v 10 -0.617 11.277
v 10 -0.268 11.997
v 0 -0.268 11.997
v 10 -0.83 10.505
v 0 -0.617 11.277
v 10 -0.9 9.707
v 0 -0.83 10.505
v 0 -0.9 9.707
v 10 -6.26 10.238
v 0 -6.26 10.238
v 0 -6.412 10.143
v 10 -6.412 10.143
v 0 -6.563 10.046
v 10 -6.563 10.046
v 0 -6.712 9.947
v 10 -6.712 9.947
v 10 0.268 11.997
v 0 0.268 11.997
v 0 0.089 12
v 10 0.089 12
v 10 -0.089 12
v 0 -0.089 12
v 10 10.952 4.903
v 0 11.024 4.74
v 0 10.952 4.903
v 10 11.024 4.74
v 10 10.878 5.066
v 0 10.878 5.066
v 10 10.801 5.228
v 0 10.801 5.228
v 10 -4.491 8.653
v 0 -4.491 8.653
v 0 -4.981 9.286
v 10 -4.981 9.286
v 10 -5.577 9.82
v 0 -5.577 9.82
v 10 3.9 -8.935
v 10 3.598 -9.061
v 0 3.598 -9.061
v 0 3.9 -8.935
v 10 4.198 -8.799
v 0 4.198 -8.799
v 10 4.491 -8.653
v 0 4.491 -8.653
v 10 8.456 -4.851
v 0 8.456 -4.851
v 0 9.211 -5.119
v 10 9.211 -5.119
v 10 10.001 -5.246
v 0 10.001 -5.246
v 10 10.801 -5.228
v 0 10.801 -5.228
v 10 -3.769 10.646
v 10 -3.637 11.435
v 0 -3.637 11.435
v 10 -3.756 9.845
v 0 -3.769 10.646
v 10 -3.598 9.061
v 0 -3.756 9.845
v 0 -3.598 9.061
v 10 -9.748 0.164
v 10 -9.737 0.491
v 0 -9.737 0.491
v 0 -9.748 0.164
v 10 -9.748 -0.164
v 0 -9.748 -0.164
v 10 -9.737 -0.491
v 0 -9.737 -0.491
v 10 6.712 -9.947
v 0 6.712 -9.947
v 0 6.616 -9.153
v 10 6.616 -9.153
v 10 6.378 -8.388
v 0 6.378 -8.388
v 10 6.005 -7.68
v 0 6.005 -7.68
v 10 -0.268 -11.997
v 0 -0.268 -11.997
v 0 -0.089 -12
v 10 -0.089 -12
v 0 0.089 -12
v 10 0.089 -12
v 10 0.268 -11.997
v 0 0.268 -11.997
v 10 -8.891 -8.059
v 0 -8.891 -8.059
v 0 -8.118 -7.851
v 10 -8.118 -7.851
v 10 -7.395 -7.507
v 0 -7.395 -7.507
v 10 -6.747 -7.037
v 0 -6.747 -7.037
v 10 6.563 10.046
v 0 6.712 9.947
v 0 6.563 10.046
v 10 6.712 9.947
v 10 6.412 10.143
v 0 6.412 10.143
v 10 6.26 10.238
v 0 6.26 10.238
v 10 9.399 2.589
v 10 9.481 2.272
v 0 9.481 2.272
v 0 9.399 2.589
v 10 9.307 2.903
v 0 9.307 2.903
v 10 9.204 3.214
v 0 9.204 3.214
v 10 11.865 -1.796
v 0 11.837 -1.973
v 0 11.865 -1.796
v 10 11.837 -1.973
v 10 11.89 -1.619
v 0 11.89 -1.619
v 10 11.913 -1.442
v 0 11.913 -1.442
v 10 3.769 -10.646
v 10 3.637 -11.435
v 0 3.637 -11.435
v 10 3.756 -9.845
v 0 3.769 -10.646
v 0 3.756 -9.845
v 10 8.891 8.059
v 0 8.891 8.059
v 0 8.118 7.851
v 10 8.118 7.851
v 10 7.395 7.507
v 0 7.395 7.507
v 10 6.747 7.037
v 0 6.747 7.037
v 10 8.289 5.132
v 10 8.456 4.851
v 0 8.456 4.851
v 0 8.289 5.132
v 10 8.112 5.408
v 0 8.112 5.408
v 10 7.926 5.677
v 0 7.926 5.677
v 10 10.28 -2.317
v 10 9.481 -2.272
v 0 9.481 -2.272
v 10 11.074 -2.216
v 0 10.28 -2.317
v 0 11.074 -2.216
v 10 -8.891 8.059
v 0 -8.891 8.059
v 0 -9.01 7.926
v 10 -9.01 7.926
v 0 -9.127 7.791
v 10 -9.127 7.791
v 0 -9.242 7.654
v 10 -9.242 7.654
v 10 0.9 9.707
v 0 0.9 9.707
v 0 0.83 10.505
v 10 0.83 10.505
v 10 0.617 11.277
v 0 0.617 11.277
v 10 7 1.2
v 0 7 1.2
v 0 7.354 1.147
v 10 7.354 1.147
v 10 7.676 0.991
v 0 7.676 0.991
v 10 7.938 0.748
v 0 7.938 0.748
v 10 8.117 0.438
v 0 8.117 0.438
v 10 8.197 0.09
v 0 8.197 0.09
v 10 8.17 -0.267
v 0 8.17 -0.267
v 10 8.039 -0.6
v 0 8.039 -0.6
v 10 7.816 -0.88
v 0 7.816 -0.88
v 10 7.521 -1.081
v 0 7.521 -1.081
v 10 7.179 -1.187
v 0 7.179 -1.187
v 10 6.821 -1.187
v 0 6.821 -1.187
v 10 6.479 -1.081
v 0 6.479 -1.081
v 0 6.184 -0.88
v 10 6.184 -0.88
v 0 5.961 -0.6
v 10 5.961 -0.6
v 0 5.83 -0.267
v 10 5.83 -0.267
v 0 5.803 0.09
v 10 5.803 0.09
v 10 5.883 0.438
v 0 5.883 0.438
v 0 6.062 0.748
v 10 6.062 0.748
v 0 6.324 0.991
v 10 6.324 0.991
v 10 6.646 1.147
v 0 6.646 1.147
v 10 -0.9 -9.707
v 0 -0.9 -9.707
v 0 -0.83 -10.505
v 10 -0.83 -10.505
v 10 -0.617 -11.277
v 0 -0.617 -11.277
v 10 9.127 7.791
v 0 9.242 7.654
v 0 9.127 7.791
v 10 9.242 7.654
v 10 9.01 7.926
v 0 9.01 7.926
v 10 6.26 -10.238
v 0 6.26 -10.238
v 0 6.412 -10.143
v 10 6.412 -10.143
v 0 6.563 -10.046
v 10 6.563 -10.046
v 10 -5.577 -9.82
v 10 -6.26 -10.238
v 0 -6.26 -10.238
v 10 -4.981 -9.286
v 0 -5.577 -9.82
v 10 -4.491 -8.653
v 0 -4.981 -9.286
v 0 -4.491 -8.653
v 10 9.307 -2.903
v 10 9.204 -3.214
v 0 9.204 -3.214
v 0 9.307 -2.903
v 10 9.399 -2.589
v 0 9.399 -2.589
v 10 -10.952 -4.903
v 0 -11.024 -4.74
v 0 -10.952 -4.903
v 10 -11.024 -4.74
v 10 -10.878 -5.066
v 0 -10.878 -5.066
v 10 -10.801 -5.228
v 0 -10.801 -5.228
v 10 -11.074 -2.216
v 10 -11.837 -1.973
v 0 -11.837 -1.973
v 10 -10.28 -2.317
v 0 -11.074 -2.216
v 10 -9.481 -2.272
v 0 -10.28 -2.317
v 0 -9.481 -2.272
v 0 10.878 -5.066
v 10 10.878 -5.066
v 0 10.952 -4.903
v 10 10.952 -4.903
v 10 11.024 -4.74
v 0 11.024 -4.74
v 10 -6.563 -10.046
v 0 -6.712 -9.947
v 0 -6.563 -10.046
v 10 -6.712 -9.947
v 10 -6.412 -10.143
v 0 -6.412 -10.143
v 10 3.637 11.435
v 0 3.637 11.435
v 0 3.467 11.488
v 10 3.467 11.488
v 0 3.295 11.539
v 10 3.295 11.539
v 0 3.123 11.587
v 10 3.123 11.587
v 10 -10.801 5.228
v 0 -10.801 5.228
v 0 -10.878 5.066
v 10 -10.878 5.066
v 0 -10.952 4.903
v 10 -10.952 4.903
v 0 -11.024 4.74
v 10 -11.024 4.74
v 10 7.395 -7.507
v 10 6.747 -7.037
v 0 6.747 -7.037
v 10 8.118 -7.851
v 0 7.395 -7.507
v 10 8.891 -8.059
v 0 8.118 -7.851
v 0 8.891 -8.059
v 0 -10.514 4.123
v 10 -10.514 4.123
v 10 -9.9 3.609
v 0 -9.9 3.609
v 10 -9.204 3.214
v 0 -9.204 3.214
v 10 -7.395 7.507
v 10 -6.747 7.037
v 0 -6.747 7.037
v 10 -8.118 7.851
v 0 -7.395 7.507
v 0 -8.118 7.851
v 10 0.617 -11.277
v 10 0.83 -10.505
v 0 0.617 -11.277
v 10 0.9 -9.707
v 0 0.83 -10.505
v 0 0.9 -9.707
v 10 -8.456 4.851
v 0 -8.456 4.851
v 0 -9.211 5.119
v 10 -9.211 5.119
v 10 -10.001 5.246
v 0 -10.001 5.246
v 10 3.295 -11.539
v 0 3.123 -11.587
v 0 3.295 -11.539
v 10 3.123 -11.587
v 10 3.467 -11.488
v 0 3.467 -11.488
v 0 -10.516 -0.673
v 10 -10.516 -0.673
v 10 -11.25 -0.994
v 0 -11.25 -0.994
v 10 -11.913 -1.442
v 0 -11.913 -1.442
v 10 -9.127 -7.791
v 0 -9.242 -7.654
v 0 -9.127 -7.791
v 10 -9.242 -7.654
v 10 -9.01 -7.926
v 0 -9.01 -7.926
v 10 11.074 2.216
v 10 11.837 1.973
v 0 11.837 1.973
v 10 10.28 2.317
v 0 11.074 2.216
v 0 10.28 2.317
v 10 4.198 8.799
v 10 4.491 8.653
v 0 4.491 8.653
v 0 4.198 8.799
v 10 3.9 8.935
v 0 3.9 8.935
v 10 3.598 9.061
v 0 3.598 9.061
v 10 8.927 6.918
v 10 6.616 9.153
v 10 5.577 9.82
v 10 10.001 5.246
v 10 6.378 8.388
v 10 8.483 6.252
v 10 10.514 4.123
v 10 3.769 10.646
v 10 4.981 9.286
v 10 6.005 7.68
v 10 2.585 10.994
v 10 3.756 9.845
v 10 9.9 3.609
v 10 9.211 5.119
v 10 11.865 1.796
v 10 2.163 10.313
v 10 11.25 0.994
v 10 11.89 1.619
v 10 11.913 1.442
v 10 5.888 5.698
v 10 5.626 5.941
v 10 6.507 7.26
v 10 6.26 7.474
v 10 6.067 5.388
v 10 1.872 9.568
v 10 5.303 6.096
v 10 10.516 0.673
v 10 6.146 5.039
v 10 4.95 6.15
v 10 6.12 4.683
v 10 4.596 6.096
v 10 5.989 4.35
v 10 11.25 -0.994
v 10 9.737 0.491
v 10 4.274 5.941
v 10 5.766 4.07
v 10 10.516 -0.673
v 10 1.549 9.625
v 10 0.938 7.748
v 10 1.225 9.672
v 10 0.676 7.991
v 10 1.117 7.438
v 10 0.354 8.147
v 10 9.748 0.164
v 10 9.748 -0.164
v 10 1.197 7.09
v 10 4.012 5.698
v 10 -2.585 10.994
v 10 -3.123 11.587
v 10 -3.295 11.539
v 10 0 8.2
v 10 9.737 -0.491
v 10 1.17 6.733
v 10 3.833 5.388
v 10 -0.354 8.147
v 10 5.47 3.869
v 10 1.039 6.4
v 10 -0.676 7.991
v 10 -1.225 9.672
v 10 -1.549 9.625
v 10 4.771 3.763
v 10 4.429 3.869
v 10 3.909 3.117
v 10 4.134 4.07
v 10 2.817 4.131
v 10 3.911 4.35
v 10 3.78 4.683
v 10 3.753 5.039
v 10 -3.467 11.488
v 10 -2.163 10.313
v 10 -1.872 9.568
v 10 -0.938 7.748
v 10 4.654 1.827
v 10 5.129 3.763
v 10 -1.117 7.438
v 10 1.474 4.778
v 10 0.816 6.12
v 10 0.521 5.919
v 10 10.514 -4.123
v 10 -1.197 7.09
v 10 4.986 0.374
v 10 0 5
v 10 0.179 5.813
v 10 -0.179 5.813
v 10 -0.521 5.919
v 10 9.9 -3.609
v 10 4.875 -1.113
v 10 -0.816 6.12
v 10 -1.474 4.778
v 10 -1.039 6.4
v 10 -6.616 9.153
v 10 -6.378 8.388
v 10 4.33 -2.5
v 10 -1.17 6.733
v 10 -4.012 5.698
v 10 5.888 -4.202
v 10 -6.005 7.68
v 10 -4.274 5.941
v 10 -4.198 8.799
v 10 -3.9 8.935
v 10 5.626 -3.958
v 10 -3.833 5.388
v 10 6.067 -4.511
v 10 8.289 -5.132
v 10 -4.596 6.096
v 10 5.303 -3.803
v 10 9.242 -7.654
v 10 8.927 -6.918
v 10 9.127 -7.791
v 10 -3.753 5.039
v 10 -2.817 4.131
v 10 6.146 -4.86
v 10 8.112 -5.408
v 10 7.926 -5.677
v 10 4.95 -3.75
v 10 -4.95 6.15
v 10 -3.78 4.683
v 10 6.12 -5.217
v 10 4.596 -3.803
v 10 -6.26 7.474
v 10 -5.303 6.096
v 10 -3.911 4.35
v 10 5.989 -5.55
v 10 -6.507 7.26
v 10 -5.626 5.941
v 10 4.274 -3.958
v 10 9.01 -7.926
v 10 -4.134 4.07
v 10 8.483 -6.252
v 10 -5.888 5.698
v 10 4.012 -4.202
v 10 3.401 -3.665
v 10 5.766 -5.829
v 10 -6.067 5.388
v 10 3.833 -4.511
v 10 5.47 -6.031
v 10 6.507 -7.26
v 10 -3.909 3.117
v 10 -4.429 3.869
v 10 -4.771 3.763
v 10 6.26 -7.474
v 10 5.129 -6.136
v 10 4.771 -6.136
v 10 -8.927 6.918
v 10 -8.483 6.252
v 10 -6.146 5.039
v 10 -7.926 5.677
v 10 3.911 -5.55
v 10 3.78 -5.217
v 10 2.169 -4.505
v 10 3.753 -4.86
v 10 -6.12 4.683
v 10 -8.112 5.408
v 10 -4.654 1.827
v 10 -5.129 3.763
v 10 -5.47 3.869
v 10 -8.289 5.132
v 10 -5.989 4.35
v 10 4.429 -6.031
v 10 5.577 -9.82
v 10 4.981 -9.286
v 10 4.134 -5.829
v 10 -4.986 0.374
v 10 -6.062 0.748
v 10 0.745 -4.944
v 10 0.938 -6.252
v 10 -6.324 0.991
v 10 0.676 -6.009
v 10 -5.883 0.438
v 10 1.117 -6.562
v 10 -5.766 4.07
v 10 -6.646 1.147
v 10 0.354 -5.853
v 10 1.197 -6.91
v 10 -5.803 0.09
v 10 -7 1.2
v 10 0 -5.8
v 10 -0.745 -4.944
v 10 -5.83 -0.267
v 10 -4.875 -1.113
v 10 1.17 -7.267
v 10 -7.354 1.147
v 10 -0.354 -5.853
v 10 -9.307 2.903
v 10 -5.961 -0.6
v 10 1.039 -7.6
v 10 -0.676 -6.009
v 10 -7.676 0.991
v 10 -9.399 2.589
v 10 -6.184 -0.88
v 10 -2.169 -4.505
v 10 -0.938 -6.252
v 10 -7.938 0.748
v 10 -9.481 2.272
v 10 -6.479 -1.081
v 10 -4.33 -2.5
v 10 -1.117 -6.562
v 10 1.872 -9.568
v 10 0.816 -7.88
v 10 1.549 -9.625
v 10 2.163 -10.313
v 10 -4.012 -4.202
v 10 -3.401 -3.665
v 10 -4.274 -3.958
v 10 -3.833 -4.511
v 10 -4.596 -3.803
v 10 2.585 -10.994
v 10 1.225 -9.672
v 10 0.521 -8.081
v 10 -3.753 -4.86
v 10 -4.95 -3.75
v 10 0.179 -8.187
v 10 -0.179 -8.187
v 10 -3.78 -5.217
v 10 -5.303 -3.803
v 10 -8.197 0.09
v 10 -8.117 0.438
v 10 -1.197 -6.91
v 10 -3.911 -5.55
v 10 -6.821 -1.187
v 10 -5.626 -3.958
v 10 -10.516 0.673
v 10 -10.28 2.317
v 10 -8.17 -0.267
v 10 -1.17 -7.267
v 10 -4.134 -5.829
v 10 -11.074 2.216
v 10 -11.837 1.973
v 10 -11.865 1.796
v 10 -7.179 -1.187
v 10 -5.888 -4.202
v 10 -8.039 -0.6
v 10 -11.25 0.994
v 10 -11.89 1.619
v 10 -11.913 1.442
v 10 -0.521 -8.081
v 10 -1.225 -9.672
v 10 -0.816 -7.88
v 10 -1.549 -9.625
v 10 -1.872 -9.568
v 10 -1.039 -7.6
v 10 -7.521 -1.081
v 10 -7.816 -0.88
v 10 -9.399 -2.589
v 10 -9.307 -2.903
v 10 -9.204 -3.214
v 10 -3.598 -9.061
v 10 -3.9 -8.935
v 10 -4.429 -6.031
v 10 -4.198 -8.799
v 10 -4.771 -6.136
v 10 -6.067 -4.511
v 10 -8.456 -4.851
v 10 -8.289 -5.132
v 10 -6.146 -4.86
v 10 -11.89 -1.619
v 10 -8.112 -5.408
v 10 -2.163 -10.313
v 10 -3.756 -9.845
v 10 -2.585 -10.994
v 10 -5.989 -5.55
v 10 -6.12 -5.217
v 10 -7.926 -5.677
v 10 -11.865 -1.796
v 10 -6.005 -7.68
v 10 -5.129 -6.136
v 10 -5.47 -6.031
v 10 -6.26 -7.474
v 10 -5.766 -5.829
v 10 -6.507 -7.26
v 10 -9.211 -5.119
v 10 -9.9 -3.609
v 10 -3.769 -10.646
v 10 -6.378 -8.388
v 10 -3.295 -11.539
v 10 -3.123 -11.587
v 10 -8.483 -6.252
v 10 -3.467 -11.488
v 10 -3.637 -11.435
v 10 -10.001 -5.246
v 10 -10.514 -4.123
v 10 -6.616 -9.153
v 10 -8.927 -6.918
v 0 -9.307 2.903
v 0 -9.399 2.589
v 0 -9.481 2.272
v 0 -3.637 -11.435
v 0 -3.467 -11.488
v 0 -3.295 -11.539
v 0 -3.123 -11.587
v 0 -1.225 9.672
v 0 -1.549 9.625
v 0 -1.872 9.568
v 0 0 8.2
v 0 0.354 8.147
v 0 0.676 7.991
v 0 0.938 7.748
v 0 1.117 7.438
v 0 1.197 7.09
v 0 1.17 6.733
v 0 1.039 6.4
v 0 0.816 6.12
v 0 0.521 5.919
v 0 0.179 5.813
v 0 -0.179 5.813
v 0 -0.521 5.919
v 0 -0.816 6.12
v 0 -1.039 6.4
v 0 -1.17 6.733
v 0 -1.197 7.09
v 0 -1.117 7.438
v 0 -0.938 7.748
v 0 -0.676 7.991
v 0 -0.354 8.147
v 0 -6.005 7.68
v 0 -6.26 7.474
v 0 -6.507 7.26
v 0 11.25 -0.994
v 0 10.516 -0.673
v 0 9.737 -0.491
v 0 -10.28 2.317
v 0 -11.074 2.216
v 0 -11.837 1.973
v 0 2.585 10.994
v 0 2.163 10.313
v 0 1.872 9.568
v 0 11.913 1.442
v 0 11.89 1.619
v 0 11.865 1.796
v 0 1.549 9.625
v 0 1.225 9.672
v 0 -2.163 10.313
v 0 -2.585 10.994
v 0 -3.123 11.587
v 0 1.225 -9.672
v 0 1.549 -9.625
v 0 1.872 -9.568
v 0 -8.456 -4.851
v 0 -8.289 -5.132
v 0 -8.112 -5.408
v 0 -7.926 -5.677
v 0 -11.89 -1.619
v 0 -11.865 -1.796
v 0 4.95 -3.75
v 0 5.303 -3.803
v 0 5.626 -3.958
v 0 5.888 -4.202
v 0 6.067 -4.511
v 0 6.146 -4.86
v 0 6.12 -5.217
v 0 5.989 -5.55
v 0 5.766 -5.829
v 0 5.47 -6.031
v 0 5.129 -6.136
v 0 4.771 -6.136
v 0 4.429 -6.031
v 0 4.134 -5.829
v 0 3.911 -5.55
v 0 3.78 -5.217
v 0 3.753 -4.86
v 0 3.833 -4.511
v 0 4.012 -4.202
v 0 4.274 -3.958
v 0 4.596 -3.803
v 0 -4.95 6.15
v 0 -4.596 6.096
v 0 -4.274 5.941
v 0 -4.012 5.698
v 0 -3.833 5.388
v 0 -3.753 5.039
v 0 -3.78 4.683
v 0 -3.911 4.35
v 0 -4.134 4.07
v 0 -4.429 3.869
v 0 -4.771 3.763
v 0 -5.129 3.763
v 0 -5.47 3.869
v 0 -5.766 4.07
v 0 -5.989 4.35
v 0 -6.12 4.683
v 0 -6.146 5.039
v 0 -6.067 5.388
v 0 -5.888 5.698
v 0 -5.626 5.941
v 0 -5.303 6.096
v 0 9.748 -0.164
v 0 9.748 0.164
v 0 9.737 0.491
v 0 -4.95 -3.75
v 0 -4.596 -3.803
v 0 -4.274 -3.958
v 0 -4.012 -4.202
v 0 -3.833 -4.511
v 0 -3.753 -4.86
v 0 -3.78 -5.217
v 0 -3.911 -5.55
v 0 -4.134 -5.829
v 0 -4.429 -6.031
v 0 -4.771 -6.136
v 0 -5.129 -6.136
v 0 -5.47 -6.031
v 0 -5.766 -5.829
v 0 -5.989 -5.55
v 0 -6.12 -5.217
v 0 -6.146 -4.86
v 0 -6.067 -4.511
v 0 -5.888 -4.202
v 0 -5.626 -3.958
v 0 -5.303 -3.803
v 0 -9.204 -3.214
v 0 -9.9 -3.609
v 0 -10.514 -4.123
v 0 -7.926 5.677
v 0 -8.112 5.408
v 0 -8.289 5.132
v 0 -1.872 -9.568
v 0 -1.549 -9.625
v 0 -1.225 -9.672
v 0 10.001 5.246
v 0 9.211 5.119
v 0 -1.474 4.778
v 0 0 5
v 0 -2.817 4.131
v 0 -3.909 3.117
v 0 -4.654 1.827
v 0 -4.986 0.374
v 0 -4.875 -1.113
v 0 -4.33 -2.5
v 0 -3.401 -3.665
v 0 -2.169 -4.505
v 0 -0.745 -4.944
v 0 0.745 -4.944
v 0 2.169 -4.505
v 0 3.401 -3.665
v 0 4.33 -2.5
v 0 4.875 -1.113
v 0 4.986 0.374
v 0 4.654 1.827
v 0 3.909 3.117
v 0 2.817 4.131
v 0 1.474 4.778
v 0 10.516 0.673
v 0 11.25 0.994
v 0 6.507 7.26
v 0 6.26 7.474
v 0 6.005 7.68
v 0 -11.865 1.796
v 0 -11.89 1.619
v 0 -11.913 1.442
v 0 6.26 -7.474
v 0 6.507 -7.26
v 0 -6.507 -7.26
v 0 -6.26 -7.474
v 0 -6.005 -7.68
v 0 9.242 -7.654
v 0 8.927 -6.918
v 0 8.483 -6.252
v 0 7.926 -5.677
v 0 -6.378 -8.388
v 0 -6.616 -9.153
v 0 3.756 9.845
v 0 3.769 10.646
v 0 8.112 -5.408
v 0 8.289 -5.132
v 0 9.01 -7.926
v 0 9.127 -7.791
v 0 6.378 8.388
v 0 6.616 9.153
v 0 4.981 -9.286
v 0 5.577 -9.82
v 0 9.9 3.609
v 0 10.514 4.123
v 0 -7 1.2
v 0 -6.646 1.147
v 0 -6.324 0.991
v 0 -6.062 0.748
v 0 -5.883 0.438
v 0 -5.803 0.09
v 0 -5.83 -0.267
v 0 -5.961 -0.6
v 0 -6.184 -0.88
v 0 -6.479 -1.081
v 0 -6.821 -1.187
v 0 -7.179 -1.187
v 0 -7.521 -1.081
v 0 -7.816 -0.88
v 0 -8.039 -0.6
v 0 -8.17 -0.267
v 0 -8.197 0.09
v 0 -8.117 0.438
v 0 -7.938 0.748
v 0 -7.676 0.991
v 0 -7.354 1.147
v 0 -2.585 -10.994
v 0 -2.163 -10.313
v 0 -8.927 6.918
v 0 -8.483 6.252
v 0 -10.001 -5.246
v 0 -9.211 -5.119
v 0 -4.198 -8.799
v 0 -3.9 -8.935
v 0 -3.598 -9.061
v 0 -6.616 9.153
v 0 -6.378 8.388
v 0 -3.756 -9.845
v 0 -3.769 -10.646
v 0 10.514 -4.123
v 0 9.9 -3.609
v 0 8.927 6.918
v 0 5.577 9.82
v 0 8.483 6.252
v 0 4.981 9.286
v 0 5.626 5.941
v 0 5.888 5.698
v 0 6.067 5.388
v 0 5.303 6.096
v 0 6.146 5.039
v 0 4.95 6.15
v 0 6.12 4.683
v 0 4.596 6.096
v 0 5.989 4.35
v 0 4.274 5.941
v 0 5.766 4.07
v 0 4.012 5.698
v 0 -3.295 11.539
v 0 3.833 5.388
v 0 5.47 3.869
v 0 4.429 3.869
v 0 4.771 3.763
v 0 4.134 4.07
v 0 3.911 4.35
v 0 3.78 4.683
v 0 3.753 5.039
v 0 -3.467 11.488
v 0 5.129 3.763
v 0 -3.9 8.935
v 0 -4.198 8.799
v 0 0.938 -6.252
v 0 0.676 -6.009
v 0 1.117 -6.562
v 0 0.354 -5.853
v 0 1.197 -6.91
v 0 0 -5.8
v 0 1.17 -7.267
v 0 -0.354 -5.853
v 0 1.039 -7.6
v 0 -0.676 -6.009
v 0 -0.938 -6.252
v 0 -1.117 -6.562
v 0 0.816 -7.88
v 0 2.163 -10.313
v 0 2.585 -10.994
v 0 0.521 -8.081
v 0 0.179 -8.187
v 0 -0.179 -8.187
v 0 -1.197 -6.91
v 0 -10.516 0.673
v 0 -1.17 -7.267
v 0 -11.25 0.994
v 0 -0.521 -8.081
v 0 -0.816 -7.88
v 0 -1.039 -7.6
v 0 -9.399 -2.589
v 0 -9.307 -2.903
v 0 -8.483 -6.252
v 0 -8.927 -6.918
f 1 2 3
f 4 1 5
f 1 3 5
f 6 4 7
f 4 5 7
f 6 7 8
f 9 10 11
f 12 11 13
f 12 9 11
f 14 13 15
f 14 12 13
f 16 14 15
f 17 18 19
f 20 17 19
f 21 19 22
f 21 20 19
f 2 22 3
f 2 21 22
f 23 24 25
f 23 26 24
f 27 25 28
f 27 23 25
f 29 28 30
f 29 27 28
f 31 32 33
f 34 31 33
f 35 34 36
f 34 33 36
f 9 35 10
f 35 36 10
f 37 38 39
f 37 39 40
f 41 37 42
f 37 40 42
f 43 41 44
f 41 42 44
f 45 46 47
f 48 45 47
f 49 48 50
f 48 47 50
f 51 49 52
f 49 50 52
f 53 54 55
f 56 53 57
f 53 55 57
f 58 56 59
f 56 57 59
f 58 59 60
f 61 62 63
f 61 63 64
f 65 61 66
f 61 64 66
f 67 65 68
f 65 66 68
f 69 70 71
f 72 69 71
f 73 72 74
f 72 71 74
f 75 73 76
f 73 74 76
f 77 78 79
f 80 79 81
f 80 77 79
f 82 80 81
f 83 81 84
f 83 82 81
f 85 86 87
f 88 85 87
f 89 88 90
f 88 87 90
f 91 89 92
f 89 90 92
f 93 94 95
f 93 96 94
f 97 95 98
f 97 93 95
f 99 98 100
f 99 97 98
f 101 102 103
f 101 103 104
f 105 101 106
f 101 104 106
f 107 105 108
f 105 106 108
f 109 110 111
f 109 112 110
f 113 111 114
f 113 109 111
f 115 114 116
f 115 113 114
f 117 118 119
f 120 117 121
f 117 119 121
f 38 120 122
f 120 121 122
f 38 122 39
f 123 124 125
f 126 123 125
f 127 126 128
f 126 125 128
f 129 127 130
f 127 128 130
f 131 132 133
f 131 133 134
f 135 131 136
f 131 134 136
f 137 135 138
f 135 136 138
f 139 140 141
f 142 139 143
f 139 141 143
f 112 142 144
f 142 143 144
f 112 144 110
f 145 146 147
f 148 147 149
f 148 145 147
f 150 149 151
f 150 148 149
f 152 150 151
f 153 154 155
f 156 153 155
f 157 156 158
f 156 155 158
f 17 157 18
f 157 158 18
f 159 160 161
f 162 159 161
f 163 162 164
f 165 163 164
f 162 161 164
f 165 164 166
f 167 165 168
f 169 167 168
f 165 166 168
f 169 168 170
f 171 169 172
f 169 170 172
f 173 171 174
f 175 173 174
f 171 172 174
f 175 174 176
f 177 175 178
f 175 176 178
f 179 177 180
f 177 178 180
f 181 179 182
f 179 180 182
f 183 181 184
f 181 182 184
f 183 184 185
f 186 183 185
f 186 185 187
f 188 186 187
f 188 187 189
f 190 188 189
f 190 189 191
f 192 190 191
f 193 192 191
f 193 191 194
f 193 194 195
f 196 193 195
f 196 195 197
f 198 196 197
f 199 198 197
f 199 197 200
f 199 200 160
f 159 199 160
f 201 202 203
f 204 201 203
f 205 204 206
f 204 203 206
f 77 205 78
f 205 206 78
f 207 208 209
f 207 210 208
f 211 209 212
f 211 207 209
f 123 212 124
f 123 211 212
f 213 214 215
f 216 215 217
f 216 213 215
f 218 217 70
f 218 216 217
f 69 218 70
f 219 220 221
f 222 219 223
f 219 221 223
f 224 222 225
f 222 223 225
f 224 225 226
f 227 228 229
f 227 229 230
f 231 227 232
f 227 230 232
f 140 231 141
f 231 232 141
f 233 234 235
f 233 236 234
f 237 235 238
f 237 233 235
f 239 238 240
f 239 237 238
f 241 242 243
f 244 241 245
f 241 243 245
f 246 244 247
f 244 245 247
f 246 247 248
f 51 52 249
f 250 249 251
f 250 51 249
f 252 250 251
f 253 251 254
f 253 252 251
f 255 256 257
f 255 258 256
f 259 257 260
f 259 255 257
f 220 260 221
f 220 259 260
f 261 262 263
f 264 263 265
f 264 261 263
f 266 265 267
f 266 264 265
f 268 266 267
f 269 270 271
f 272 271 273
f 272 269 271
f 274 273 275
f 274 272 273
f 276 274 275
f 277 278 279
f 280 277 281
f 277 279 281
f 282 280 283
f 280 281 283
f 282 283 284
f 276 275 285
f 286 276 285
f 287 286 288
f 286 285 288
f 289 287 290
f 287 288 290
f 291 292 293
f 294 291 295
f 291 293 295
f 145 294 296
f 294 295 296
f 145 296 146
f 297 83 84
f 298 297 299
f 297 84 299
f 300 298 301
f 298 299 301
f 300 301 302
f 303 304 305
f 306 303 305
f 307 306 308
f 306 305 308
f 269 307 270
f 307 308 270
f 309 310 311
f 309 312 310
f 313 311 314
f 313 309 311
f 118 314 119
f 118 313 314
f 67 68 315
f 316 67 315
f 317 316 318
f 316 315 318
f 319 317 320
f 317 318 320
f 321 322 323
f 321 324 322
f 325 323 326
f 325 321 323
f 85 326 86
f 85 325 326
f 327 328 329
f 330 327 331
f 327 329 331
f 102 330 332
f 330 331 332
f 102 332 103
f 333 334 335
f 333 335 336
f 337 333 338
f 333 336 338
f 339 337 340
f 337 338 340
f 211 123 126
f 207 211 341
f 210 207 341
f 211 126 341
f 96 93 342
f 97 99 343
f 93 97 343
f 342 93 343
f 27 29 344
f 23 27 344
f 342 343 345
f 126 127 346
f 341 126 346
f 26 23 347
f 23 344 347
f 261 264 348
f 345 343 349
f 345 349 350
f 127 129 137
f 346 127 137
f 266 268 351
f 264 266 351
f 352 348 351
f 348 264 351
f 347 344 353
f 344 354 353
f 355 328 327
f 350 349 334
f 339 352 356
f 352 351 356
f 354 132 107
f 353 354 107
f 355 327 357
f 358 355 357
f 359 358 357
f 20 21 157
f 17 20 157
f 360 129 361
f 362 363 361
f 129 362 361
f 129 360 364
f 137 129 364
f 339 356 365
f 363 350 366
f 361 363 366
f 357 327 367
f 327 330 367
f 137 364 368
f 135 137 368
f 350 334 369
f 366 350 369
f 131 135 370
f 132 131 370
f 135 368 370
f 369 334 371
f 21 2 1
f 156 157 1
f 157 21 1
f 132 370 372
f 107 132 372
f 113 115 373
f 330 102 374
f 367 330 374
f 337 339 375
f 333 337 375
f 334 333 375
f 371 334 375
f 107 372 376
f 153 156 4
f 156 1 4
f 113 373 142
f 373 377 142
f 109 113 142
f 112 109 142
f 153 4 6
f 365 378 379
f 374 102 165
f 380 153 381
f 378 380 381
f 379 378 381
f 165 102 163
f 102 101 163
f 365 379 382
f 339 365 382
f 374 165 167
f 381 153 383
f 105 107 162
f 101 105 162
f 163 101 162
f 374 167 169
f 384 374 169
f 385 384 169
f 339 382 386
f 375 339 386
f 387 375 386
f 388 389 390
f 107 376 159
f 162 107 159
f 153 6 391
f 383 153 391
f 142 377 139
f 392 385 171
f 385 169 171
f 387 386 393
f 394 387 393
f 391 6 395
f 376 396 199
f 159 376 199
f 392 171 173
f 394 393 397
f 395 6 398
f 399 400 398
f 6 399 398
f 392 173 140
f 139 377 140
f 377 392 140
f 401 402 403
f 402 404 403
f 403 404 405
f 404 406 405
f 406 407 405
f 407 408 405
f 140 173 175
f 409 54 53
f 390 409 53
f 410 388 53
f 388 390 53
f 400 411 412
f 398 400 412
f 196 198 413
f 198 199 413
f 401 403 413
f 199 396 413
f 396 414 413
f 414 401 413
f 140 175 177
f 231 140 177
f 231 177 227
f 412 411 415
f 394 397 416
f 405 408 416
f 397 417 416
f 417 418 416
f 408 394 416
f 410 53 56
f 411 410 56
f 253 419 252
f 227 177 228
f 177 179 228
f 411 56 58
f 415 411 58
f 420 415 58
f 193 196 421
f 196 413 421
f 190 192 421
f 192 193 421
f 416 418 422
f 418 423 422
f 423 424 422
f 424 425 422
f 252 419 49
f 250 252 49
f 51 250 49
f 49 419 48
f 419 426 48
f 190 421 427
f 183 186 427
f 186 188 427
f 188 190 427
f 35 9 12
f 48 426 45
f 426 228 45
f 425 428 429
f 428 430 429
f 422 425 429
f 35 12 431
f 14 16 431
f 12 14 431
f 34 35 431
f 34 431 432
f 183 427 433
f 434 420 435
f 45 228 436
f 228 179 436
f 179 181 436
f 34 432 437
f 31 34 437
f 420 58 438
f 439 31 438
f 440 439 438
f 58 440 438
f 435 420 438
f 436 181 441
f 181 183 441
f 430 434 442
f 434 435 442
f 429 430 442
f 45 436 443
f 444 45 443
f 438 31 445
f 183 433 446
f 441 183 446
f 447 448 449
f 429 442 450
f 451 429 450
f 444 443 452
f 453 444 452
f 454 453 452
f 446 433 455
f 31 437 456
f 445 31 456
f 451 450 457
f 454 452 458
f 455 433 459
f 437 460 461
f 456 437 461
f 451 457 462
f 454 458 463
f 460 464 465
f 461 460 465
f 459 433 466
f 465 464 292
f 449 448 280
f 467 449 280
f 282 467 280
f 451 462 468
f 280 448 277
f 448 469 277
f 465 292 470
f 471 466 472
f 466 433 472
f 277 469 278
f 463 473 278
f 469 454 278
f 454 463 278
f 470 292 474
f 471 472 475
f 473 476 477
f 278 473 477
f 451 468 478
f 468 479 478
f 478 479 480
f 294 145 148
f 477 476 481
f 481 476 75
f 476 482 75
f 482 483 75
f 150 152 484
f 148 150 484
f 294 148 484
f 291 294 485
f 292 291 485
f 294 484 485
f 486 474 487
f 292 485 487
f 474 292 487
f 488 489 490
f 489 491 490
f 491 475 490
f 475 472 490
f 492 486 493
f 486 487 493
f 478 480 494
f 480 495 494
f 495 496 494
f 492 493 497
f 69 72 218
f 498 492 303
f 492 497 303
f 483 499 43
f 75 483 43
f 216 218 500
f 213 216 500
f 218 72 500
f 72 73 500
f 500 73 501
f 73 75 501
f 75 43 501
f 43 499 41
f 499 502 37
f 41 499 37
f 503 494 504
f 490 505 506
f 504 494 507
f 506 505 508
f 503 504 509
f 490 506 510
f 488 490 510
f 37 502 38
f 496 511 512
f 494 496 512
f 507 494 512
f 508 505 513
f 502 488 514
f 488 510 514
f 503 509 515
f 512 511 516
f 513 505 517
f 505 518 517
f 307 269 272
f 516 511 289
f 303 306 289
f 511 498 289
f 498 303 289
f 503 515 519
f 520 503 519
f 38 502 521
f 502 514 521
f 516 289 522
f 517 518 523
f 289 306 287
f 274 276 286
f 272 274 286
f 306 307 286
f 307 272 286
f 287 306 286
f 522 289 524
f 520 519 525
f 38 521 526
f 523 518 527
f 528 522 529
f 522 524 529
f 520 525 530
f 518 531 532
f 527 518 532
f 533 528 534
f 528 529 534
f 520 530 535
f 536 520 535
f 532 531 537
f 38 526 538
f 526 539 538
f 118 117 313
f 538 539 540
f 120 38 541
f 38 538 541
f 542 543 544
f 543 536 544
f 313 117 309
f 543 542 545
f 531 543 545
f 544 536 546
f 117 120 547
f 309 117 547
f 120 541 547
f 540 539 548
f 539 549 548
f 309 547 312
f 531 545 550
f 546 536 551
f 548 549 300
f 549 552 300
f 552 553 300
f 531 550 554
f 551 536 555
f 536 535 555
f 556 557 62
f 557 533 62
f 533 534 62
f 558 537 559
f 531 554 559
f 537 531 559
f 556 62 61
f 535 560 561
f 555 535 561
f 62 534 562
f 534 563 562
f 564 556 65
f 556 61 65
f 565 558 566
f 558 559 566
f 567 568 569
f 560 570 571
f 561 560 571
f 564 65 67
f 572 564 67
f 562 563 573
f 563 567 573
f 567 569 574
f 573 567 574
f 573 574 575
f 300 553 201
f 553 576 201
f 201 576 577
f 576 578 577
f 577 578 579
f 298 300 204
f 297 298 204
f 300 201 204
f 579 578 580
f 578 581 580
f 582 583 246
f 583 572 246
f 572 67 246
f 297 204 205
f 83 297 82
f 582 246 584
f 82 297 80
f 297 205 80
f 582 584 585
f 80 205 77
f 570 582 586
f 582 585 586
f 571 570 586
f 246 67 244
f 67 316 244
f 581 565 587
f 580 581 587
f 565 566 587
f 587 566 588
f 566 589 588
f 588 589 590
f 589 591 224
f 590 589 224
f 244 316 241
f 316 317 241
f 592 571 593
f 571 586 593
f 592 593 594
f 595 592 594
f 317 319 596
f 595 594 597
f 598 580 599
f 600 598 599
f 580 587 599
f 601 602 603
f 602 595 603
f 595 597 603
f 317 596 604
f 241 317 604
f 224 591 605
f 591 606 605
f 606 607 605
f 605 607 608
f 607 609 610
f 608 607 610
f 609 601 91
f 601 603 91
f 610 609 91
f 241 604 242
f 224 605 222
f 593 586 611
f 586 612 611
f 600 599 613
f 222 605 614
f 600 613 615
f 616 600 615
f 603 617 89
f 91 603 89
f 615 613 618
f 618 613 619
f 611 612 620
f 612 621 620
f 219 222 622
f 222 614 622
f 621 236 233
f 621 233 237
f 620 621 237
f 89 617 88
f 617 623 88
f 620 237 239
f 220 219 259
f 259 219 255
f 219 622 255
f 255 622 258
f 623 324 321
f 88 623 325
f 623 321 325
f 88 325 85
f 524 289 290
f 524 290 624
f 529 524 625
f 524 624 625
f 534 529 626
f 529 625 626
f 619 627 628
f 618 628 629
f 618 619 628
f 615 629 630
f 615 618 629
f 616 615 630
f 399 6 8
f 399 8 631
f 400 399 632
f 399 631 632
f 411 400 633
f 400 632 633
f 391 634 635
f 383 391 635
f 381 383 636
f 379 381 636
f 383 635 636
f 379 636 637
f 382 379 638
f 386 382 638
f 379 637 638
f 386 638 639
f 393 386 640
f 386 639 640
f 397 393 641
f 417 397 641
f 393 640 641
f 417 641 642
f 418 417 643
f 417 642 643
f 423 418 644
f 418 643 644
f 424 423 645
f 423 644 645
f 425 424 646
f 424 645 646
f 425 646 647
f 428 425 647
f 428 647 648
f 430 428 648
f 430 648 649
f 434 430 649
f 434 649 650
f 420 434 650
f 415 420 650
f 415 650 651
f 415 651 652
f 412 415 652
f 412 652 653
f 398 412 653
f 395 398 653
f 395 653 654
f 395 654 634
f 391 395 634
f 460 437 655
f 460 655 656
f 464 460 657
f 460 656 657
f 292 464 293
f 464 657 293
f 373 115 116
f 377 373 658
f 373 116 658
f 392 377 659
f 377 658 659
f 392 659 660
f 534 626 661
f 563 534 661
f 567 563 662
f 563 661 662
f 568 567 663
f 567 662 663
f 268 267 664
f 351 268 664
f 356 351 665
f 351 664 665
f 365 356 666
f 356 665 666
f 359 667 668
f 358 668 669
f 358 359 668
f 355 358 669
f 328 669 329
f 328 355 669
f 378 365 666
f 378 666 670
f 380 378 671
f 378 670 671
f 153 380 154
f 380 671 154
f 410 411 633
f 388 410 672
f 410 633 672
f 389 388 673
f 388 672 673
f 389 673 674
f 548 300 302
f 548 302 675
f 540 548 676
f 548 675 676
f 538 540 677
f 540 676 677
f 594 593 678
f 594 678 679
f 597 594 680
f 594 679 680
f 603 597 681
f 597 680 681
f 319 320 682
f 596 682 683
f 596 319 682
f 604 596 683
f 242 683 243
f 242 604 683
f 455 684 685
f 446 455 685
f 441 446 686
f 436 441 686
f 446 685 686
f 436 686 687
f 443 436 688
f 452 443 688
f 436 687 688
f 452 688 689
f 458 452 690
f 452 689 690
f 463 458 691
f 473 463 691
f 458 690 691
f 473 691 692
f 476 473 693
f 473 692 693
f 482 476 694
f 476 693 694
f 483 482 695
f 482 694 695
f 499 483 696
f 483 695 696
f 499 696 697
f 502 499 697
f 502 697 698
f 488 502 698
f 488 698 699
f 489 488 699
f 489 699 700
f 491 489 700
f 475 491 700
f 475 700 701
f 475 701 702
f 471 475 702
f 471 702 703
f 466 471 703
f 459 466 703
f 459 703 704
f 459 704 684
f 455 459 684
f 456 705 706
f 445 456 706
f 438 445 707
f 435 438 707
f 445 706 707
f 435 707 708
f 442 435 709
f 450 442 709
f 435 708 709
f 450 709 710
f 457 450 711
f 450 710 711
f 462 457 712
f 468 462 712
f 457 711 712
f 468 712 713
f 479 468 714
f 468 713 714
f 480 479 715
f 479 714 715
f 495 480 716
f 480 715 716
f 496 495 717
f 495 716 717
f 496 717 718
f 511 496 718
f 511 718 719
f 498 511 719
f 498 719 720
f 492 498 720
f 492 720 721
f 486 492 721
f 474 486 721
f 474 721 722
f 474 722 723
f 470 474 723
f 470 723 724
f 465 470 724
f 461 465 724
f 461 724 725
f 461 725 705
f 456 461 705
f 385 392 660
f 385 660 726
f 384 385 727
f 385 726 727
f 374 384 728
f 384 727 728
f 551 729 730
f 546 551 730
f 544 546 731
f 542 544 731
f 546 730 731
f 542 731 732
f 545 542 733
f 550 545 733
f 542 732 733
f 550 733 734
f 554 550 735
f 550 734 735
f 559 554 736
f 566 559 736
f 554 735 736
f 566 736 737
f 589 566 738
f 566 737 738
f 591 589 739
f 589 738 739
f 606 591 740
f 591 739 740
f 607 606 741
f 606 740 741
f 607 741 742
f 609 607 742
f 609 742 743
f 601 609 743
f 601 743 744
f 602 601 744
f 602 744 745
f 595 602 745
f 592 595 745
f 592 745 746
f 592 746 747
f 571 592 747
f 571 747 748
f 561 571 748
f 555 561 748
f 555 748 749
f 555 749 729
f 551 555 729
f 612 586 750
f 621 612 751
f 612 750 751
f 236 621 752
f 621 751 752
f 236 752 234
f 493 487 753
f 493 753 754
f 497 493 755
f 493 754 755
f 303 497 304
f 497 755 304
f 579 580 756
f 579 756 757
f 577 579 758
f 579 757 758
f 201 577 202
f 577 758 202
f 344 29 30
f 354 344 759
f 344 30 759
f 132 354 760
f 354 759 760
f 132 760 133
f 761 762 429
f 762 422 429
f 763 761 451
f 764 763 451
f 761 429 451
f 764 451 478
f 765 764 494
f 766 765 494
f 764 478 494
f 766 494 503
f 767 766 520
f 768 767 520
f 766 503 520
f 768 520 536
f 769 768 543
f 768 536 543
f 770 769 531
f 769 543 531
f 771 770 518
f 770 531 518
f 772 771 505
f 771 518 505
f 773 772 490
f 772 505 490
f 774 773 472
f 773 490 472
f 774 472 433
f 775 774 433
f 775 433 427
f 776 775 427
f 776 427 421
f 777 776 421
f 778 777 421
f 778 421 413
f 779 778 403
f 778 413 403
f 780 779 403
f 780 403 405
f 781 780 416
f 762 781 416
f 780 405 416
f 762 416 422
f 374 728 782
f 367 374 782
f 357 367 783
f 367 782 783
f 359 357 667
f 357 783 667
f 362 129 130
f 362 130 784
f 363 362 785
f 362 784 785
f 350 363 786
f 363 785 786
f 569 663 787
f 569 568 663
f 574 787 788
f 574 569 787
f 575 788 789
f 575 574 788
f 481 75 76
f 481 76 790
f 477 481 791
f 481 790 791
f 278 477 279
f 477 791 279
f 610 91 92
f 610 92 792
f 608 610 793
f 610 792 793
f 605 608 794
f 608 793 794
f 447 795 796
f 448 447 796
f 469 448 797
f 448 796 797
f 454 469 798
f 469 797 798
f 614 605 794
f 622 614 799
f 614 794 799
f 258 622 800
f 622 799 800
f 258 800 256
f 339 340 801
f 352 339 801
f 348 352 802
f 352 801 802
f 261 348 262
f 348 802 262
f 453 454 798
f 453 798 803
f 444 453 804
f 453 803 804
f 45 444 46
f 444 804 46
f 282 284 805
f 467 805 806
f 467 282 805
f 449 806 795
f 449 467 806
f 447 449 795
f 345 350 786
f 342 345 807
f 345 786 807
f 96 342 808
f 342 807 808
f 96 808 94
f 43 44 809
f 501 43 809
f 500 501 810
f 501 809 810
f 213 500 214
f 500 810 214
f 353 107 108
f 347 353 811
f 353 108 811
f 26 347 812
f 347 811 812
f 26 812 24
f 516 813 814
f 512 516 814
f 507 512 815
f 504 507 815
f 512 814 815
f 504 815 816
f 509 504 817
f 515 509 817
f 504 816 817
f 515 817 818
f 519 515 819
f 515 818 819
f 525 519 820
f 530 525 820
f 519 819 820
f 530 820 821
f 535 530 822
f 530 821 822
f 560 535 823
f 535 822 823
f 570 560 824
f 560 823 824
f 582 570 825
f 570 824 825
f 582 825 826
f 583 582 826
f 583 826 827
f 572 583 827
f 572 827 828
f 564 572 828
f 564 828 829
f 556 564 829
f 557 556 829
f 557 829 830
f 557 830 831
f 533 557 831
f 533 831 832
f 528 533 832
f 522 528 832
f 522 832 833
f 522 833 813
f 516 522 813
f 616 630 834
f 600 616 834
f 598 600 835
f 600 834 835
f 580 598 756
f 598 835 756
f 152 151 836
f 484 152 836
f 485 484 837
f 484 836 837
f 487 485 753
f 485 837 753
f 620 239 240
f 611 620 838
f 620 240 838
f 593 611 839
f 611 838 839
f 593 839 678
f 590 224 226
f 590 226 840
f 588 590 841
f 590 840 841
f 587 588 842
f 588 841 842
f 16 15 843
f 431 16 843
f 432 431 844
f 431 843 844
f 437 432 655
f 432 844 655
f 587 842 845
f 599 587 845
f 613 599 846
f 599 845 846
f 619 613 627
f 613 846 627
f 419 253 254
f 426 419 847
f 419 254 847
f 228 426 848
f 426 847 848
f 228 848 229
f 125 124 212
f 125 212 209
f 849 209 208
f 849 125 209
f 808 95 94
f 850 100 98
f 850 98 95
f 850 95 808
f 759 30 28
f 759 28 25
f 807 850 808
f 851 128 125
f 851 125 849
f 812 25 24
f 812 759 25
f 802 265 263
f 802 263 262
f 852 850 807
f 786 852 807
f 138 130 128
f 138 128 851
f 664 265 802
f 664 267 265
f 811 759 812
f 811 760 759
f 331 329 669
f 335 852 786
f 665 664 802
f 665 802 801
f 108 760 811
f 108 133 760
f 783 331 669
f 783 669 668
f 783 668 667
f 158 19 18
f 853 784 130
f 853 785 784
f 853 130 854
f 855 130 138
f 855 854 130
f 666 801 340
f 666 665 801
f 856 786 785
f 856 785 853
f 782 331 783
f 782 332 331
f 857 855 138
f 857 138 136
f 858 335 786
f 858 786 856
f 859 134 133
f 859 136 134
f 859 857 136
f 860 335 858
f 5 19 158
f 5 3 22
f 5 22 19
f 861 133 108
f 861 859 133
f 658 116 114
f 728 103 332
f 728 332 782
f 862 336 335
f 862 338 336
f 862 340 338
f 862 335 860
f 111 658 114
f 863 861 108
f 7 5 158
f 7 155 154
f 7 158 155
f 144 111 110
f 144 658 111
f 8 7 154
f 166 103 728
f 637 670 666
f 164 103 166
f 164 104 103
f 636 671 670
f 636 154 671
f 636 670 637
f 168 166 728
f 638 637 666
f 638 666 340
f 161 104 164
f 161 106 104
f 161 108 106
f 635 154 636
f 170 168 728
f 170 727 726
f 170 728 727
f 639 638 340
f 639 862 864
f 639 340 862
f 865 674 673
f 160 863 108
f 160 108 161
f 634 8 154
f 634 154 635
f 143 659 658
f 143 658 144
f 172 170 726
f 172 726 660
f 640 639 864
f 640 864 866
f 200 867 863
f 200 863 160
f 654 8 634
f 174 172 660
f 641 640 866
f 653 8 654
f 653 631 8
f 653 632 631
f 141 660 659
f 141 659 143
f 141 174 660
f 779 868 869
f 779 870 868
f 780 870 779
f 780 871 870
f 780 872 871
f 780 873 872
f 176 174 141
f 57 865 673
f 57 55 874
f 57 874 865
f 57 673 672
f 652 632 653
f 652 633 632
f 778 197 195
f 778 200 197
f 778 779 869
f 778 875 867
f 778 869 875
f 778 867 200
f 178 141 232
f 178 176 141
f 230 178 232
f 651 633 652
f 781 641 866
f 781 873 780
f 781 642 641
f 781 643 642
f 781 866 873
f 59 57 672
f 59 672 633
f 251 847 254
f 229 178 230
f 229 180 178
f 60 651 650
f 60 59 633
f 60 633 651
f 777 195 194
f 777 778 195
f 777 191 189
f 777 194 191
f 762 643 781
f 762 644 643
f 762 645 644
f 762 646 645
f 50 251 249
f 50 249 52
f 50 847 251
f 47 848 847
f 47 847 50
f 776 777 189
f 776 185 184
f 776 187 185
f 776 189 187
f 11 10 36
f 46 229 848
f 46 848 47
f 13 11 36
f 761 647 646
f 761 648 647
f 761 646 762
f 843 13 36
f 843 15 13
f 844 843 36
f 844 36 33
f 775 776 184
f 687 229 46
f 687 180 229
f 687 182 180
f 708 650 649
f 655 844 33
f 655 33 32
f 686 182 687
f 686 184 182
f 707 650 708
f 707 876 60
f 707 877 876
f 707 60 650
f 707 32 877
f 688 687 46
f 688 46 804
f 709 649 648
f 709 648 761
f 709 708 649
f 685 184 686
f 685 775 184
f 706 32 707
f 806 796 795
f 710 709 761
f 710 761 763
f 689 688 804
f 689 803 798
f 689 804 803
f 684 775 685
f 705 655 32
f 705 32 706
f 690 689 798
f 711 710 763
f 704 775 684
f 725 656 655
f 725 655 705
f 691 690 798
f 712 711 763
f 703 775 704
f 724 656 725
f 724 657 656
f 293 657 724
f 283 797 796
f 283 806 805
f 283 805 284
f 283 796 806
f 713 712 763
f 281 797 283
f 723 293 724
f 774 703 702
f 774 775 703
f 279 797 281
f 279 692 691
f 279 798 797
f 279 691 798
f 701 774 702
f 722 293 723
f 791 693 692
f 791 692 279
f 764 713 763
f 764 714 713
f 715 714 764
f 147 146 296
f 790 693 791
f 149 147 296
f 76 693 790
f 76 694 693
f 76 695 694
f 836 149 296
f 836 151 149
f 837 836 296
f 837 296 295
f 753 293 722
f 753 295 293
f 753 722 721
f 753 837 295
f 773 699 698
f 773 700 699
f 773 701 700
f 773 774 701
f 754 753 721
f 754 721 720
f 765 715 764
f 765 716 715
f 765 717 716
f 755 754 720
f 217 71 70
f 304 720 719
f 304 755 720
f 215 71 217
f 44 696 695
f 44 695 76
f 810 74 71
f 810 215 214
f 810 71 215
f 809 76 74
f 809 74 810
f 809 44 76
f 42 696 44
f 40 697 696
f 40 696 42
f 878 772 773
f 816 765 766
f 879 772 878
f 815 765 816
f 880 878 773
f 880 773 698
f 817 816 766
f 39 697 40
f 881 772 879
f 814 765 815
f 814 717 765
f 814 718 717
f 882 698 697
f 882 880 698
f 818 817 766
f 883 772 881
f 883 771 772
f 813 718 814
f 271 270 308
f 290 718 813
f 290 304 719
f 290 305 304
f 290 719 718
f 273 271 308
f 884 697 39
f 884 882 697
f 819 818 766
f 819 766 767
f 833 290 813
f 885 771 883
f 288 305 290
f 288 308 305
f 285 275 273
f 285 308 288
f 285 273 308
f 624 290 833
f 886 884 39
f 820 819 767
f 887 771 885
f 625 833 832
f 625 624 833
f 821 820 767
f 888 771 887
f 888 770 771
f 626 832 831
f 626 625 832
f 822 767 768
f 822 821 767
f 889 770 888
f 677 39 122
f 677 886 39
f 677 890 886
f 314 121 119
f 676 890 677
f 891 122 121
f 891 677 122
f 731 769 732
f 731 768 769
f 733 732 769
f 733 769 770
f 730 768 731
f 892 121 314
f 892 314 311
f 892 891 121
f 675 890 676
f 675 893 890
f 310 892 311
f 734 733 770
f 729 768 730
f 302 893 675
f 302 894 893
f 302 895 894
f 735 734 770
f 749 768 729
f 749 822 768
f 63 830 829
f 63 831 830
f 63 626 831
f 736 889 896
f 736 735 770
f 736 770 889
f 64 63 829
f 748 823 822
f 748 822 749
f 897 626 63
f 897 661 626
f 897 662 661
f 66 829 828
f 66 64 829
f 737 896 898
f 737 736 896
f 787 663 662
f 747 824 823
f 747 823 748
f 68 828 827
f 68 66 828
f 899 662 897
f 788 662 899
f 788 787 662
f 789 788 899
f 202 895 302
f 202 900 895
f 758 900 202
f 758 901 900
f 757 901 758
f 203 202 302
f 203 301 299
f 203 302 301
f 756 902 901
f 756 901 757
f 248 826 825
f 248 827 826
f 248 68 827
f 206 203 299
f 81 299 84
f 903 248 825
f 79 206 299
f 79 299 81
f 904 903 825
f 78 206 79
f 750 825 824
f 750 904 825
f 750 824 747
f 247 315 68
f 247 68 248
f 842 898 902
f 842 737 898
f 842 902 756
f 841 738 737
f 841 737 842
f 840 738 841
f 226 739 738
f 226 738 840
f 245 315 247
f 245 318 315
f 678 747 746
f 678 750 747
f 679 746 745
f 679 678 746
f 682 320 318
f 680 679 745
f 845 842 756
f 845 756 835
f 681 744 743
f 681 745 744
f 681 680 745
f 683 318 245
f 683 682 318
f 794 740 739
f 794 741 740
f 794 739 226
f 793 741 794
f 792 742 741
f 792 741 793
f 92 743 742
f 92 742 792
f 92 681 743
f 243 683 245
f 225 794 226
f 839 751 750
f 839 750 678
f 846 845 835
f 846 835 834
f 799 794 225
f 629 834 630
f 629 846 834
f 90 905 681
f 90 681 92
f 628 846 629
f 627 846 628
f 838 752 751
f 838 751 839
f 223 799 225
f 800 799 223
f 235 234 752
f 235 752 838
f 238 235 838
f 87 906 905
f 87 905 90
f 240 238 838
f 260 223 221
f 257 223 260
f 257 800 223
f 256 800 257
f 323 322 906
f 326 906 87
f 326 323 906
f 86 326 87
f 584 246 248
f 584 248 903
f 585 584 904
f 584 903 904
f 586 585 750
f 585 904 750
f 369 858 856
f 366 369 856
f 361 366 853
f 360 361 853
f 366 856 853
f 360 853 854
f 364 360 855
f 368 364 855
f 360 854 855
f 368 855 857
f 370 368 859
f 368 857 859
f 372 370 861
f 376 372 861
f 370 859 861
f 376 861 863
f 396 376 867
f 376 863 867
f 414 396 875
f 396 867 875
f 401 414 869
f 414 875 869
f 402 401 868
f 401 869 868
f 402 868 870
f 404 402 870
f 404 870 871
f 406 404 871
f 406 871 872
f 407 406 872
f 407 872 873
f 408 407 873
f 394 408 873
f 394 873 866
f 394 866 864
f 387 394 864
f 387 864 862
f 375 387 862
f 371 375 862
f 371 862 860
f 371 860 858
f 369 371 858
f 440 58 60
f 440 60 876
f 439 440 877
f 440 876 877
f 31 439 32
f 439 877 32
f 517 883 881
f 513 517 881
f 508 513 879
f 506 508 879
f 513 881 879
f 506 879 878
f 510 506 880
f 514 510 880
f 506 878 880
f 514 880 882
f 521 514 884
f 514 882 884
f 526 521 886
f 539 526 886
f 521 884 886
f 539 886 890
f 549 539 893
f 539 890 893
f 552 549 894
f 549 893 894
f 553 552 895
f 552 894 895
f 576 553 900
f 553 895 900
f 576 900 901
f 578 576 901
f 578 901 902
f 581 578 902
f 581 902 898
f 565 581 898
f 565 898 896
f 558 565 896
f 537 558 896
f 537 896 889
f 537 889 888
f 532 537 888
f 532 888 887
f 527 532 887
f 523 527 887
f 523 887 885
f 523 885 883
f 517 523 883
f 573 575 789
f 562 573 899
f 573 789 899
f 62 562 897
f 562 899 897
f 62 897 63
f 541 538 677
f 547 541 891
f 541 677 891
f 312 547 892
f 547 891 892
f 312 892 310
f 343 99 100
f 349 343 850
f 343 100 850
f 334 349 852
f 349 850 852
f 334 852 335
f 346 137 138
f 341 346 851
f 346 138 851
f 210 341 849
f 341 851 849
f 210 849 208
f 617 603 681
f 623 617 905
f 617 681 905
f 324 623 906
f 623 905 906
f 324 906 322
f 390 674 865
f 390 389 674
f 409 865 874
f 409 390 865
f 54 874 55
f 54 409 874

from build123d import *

# Parameters (mm, degrees)
BASPROSKE_W          = 10
BASPROSKE_H          = 12
TOOTHCUT_DEPTH       = 20.697715604
TEETHCUTS_COUNT      = 22
TEETHCUTS_ANGLE      = 343.636363636
BORSKE_R             = 5
BORE_DEPTH           = 50.0000508
D_GAGEMENT_M21_D     = 2.4
D_GAGEMENT_M21_DEPTH = 10


with BuildPart() as part:
    # BasProSke → Base-Revolve (revolve)
    with BuildSketch(Plane(origin=(0, 0, 0), x_dir=(1, 0, 0), z_dir=(0, 1, 0)), mode=Mode.PRIVATE) as base_revolve_sk:
        with Locations((5, 6)):
            Rectangle(BASPROSKE_W, BASPROSKE_H)
    revolve(base_revolve_sk.sketch.rotate(Axis((-10, 0, 0), (1, 0, 0)), 180), axis=Axis((-10, 0, 0), (1, 0, 0)))

    # TooCutSke → ToothCut (cut, through all)
    with BuildSketch(Plane(origin=(0, 0, 0), x_dir=(0, 0, -1), z_dir=(1, 0, 0))):
        with BuildLine():
            ThreePointArc((0.491001901, 9.736627657), (0, 9.749), (-0.491001901, 9.736627657))
            ThreePointArc((-0.491001901, 9.736627657), (-0.822824844, 10.904005344), (-1.46093845, 11.936327074))
            ThreePointArc((-1.46093845, 11.936327074), (0, 12.0254), (1.46093845, 11.936327074))
            ThreePointArc((1.46093845, 11.936327074), (0.822824844, 10.904005344), (0.491001901, 9.736627657))
        make_face()
    toothcut = extrude(amount=TOOTHCUT_DEPTH, mode=Mode.SUBTRACT)

    # TeethCuts: ToothCut ×22 about axis
    teethcuts_axis = Axis((-10, 0, 0), (1, 0, 0))
    for i in range(1, TEETHCUTS_COUNT):
        add(toothcut.rotate(teethcuts_axis, i * TEETHCUTS_ANGLE / (TEETHCUTS_COUNT - 1)), mode=Mode.SUBTRACT)

    # BorSke → Bore (cut, symmetric)
    with BuildSketch(Plane(origin=(0, 0, 0), x_dir=(0, 0, -1), z_dir=(1, 0, 0))):
        with Locations(Location((0, 0, 0), (0, 0, 180))):
            Circle(BORSKE_R)
    extrude(amount=BORE_DEPTH, both=True, mode=Mode.SUBTRACT)

    # Dégagement M21
    with Locations(Plane(origin=(10, 0, 0), x_dir=(0, 0, -1), z_dir=(1, 0, 0))):
        with Locations((0, 7), (4.949747468, 4.949747468), (7, 0), (4.949747468, -4.949747468), (0, -7), (-4.949747468, -4.949747468), (-7, 0), (-4.949747468, 4.949747468), (0, 0)):
            Hole(D_GAGEMENT_M21_D / 2, depth=D_GAGEMENT_M21_DEPTH)


solid = part.part
